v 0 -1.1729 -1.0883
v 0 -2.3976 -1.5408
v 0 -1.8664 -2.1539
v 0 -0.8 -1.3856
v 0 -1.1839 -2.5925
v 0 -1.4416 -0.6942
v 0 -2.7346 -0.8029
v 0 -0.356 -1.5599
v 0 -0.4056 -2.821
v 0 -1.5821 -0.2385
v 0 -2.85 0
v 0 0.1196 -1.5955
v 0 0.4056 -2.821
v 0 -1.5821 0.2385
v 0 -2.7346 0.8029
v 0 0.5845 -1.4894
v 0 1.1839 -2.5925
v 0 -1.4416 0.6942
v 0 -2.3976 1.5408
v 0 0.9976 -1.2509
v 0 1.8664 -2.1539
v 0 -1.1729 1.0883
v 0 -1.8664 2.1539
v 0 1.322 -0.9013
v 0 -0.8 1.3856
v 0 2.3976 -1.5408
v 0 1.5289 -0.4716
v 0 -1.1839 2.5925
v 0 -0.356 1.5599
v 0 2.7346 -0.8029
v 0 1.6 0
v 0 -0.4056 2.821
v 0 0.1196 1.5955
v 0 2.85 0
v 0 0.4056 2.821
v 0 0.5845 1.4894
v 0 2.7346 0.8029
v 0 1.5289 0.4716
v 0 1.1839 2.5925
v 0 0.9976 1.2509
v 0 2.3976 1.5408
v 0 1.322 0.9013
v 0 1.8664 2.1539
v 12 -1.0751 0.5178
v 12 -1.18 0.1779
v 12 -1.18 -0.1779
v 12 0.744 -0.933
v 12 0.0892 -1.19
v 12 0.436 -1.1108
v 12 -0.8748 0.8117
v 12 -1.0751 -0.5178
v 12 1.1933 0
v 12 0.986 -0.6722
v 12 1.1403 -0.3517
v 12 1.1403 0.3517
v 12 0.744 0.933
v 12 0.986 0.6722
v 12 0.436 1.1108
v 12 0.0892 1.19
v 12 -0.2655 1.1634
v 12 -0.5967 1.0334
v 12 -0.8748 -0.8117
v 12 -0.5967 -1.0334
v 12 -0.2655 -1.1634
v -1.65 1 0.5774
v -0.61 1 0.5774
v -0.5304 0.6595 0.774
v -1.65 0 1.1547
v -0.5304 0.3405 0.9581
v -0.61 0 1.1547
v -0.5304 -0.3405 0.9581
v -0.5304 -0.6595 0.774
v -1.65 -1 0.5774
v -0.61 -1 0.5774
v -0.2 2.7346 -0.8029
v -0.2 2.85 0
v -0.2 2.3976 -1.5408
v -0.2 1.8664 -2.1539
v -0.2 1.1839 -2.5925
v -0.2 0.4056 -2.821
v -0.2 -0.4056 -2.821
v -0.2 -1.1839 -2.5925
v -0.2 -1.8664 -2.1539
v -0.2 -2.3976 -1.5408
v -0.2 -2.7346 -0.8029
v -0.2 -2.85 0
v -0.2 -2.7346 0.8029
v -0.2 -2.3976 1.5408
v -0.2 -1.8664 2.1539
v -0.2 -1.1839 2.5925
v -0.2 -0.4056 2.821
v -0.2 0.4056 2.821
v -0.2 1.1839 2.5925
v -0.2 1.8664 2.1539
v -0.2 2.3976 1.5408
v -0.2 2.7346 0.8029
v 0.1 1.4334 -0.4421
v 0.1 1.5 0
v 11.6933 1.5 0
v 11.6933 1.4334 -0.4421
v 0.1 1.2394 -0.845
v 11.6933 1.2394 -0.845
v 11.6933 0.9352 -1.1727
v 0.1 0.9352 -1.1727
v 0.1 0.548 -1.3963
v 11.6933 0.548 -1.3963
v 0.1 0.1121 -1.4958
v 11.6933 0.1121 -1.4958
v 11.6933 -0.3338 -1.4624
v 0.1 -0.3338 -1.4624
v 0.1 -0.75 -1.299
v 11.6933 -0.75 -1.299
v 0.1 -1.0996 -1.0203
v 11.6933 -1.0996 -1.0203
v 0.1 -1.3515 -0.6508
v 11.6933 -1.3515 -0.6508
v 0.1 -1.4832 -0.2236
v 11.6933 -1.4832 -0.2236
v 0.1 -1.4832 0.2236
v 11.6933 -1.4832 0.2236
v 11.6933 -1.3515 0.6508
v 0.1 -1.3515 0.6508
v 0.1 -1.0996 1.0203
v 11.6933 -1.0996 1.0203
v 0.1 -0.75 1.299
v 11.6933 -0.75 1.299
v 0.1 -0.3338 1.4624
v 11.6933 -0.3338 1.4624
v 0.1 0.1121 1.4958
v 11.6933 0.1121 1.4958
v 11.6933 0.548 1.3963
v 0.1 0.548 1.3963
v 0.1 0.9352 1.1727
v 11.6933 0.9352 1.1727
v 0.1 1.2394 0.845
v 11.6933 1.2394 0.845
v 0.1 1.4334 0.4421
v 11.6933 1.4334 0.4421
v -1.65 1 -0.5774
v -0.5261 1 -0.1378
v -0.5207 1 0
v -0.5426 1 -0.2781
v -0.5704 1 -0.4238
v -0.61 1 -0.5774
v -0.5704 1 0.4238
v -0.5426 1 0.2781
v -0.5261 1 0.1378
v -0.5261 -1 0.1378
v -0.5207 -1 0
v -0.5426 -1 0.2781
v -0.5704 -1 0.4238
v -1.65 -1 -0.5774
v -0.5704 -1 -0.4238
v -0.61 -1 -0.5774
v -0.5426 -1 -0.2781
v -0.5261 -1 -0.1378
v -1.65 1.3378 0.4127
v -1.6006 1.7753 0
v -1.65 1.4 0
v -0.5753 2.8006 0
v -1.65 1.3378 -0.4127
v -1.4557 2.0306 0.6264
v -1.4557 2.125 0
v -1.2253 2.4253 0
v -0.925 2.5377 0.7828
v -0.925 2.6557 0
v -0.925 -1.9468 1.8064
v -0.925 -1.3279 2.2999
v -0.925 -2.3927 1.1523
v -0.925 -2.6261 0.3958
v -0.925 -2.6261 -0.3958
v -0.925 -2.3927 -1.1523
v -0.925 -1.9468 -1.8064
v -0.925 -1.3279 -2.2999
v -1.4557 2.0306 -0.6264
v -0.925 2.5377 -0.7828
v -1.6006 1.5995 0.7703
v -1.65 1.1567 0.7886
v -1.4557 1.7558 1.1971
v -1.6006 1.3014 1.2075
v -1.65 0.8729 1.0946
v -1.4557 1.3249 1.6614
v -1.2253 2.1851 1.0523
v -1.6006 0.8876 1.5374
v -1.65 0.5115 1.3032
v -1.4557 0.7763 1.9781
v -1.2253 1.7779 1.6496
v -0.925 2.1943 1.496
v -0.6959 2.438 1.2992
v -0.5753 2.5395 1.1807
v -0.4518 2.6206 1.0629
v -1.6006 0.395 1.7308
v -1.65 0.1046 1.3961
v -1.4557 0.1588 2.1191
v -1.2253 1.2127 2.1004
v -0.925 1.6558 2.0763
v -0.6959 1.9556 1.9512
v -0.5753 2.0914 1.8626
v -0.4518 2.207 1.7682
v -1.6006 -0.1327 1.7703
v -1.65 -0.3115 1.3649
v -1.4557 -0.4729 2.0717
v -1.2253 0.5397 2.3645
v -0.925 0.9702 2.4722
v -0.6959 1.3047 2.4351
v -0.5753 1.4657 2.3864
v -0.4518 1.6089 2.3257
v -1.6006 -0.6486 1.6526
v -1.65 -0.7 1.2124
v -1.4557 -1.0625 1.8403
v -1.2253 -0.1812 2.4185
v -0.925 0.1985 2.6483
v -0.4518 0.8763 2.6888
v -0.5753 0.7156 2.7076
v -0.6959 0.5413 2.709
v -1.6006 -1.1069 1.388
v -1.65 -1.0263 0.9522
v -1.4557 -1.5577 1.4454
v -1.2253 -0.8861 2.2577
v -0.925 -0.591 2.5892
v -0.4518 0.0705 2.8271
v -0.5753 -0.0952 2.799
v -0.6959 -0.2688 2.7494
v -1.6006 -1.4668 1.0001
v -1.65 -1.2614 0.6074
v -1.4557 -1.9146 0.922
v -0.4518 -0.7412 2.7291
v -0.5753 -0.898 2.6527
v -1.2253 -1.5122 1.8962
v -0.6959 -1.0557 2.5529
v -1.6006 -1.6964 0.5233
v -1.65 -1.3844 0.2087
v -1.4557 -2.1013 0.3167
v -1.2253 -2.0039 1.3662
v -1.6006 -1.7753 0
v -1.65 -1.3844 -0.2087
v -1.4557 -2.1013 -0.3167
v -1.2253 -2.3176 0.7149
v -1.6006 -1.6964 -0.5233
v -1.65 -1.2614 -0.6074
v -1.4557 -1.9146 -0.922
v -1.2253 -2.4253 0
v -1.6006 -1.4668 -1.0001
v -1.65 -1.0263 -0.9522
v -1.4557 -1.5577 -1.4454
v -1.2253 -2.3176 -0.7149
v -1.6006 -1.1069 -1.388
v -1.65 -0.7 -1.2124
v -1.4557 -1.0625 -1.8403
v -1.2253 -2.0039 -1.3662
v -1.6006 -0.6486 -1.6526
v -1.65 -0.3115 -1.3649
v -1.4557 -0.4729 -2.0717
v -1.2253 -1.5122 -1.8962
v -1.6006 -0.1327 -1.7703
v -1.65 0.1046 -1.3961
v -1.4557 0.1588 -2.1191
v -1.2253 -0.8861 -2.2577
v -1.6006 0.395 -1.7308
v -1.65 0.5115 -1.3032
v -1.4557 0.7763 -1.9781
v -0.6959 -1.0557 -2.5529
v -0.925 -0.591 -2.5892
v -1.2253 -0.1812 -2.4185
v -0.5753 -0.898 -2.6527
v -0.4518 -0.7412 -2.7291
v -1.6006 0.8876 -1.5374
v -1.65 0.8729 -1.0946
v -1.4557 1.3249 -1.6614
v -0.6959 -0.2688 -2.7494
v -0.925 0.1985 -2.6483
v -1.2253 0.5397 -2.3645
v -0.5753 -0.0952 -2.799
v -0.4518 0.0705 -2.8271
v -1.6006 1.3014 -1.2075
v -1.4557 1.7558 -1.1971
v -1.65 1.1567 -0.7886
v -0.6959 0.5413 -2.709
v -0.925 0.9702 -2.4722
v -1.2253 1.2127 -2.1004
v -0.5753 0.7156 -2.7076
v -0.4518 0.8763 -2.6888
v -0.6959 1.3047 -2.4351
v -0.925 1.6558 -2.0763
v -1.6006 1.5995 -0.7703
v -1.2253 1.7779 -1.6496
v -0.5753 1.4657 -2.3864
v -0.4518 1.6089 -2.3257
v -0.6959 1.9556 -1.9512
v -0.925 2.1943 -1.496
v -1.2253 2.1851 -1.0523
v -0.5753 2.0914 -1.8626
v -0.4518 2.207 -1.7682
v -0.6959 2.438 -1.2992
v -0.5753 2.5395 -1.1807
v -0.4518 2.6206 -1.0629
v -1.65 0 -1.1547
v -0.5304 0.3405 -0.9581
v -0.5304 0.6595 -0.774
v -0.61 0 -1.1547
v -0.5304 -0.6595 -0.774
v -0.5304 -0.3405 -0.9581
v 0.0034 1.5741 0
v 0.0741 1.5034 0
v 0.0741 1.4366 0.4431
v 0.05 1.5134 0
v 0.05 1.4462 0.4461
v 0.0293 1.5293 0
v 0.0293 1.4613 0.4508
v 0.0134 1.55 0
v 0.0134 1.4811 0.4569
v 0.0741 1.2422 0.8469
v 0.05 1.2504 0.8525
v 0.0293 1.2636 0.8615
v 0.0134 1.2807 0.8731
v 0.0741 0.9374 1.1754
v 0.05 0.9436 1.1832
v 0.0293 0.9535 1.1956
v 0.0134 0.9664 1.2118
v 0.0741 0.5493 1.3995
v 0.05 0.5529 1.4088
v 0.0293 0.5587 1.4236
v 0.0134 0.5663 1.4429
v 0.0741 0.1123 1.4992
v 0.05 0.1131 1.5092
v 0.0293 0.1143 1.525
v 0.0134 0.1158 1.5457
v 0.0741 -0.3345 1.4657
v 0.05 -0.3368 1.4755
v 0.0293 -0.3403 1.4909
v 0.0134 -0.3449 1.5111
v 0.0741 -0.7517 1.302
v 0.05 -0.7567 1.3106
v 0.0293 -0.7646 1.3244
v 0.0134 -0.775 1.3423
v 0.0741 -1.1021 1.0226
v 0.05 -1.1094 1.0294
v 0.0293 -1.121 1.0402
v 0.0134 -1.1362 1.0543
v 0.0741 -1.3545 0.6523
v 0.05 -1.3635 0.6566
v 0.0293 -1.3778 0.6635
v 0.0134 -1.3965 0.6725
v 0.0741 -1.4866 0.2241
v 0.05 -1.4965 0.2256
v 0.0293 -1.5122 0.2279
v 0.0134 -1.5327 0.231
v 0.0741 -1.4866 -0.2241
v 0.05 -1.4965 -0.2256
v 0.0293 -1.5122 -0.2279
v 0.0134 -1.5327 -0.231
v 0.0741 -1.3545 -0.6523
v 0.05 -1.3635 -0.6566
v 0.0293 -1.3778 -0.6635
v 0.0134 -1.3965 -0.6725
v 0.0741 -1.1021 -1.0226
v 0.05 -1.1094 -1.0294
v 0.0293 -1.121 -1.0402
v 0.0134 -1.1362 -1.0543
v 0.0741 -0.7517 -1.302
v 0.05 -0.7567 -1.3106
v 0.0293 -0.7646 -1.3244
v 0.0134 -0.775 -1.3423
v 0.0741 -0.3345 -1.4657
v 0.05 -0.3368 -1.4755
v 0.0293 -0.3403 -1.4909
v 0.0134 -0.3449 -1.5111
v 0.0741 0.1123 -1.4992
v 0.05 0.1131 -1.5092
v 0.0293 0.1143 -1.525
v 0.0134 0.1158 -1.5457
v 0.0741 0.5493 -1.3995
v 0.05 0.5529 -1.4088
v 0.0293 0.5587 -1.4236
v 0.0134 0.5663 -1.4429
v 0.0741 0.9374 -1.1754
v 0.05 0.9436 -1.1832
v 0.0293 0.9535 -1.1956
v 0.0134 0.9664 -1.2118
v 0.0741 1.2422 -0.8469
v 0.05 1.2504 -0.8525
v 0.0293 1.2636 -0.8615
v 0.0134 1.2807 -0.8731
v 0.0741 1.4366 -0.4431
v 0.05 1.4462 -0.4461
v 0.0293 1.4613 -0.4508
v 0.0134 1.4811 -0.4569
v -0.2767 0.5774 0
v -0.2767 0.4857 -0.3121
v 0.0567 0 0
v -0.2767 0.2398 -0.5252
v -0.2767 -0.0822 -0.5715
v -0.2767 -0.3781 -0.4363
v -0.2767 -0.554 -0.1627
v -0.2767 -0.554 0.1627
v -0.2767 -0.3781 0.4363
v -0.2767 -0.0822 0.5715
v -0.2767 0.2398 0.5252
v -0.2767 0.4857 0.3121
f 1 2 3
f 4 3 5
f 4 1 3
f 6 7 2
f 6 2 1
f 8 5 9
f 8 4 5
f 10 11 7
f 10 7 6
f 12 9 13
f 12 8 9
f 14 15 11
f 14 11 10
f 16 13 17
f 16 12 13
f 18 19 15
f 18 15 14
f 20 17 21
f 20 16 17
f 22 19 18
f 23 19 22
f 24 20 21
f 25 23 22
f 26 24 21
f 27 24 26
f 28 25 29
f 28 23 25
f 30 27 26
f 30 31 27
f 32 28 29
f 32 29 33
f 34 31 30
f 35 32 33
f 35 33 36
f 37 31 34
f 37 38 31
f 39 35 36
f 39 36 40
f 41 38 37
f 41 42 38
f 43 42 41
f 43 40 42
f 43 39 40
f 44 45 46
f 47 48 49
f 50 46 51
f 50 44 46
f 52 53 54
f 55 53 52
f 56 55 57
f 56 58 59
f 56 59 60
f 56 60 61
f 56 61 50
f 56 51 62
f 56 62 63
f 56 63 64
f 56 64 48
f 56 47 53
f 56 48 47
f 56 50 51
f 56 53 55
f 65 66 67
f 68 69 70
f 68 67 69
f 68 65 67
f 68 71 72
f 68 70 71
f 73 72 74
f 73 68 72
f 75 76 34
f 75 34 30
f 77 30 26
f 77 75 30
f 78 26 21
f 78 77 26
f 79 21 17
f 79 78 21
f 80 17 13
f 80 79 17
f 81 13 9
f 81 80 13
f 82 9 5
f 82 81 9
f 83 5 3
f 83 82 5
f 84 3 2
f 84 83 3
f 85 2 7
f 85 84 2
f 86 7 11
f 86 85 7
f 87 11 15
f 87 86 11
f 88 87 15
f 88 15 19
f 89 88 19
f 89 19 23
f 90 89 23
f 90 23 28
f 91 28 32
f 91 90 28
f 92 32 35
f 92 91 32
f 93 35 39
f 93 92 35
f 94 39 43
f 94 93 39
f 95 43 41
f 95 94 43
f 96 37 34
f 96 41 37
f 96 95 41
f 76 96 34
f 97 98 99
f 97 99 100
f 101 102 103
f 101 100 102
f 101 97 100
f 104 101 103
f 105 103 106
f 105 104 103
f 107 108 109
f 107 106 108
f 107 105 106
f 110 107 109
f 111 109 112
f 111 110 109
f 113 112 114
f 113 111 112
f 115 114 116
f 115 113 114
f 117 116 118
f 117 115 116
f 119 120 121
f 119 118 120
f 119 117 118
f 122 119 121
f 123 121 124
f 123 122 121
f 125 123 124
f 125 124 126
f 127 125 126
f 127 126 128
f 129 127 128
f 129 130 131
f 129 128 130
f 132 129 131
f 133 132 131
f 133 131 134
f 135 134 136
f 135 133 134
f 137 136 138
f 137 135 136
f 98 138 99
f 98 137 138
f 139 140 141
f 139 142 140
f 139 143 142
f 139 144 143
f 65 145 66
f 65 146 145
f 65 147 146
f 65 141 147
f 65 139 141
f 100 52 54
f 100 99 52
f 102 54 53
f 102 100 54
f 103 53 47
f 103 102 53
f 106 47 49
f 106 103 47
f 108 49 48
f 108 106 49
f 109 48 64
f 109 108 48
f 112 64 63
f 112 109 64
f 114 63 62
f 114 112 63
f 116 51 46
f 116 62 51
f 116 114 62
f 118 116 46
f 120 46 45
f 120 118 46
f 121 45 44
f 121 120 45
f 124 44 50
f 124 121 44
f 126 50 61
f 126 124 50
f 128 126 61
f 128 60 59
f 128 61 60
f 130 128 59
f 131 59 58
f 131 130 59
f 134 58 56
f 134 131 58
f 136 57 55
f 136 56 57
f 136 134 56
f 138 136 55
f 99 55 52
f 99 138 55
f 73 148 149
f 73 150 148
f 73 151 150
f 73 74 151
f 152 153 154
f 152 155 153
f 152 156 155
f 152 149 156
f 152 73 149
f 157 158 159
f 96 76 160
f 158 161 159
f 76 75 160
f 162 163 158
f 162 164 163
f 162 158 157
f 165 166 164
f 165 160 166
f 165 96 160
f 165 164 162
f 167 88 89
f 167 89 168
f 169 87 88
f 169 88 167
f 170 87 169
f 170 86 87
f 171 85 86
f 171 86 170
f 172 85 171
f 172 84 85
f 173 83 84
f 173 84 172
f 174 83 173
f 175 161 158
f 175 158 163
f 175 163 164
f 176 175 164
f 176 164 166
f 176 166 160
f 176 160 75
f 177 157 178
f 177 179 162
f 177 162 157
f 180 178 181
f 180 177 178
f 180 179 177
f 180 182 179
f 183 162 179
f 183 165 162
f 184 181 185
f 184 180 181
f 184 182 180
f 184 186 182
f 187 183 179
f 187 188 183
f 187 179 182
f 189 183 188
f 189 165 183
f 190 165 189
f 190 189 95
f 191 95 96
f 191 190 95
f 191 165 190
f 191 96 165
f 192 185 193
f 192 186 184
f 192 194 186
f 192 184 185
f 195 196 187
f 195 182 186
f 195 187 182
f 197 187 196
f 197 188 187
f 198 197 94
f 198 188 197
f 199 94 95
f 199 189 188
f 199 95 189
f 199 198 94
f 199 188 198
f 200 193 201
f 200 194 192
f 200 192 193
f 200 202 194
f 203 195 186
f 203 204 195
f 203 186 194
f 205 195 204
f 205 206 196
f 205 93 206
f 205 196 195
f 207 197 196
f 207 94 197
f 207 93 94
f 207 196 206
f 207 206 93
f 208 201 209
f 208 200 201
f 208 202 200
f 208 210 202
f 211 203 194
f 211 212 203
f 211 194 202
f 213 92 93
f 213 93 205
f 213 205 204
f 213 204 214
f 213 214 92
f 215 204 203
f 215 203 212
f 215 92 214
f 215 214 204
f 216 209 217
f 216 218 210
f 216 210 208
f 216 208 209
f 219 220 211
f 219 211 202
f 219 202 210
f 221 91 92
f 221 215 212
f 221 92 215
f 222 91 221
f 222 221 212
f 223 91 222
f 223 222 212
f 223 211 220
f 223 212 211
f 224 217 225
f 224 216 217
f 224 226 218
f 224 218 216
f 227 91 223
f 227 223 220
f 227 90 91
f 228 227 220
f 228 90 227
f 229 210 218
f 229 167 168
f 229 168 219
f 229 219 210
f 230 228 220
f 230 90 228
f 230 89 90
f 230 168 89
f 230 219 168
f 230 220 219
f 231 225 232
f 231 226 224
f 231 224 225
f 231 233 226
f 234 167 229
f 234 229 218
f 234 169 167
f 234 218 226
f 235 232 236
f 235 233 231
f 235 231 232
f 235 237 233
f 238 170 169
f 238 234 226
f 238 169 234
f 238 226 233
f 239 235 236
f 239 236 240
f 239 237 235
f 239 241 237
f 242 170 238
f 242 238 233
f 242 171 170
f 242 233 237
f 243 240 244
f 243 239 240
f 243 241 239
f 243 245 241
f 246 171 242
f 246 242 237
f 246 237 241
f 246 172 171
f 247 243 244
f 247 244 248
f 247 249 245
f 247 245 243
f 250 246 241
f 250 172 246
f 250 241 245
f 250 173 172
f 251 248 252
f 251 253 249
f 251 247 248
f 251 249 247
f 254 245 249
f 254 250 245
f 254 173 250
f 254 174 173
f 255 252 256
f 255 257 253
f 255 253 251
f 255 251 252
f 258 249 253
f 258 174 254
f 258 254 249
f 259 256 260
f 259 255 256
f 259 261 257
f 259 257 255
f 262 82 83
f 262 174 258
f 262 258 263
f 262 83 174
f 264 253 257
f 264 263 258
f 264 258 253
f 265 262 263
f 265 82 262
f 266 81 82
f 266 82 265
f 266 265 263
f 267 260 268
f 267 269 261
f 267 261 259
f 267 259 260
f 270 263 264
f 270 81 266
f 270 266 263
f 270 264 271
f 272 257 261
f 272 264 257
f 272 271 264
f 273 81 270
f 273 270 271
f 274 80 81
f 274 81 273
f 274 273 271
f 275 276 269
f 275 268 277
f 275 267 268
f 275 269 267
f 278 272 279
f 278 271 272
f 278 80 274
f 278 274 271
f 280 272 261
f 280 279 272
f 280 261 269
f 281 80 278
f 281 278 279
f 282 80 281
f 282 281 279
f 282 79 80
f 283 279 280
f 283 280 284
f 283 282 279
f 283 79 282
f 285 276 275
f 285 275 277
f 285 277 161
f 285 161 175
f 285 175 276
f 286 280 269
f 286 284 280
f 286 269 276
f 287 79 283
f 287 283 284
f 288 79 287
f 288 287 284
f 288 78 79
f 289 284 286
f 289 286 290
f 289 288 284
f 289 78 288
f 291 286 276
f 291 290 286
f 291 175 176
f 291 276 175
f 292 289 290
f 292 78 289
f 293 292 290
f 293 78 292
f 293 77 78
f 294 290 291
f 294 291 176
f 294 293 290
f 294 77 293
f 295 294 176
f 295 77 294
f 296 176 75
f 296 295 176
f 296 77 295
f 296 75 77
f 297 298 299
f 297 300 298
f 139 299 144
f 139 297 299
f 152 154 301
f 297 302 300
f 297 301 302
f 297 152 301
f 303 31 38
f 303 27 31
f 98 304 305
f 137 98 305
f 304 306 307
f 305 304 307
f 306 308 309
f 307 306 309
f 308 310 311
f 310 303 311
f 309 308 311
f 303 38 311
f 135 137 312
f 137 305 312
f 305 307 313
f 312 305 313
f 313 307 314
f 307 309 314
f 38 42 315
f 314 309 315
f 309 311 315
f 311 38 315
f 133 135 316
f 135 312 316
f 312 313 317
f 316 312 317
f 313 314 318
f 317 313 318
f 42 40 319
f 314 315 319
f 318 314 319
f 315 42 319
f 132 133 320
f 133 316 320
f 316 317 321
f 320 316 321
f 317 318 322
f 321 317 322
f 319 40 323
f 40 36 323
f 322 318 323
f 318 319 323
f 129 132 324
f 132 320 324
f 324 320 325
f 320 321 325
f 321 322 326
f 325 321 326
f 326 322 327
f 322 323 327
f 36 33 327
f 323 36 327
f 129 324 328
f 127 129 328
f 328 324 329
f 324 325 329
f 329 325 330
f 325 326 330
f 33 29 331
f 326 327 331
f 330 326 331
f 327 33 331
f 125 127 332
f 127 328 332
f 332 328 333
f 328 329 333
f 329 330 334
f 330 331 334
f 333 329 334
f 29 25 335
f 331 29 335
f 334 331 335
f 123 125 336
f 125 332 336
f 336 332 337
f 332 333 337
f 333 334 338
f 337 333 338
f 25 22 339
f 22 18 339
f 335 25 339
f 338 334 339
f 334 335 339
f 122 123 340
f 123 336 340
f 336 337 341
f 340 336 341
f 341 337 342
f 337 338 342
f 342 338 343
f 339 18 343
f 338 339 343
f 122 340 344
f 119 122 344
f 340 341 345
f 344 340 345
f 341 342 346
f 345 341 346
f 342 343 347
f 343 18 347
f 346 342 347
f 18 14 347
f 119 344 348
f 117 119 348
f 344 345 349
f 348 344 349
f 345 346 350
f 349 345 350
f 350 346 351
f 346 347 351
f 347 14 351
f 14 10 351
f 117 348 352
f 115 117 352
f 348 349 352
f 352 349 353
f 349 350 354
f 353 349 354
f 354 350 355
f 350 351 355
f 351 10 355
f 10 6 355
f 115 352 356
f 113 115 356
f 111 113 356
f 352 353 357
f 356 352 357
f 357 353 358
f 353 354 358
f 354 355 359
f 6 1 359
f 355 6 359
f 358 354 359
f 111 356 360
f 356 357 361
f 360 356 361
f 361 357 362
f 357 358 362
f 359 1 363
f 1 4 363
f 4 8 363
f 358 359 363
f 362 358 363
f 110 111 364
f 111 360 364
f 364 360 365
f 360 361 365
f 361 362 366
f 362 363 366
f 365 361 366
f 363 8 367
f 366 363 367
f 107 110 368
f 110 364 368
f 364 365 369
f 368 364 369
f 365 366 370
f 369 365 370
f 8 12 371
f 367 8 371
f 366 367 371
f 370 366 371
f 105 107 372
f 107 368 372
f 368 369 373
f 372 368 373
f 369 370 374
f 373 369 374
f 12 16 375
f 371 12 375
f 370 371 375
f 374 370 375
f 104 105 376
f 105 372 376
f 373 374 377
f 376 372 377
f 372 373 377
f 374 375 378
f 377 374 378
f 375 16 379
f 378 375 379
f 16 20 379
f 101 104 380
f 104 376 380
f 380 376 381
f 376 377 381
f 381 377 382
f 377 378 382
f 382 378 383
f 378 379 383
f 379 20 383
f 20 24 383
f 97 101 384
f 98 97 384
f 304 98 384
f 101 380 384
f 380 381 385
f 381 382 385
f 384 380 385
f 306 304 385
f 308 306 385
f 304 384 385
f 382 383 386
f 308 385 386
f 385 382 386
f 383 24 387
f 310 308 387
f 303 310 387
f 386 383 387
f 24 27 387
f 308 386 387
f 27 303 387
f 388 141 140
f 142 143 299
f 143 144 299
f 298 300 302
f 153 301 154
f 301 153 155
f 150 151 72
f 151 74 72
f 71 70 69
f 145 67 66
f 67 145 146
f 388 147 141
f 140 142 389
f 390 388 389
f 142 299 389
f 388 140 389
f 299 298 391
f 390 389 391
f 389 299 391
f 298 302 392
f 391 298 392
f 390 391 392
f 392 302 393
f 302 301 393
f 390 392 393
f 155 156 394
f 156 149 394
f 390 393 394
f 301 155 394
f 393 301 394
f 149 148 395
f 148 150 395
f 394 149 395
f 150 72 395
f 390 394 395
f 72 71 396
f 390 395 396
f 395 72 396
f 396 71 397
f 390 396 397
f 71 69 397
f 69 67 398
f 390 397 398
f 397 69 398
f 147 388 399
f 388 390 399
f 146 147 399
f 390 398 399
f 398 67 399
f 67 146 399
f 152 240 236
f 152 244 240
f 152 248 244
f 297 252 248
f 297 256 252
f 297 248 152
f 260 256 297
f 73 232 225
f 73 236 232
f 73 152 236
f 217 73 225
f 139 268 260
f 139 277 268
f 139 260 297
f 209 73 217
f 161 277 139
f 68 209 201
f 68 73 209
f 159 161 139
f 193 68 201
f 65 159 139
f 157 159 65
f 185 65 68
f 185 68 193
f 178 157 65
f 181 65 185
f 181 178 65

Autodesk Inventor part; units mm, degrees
ref_plane "YZ Plane" through (0, 0, 0) normal (1, 0, 0) x (0, 1, 0)
ref_plane "XZ Plane" through (0, 0, 0) normal (0, 1, 0) x (-1, 0, 0)
sketch "Sketch1" plane through (0, 0, 0) normal (0, 0, 1) x (1, 0, 0)
  line L0 (0.0567, 0) -> (12, 0)
  line L1 (12, 0) -> (12, 1.5)
  line L2 (12, 1.5) -> (1, 1.5)
  line L3 (1, 1.5) -> (0.6932, 1.5)
  line L4 (0.6932, 1.5) -> (0, 1.5)
  line L5 (0, 1.5) -> (0, 2.85)
  line L6 (0, 2.85) -> (-1.65, 2.85)
  line L7 (-1.65, 2.85) -> (-1.65, 1.1547)
  line L8 (-1.65, 1.1547) -> (-0.61, 1.1547)
  line L9 (-0.61, 1.1547) -> (0.0567, 0)
  line L10 (-4.38, 0) -> (14.73, 0) projected
  line L11 (0, -0.57) -> (0, 3.42) projected
  line L12 (1, 1.5) -> (0, 1.5) construction
  dimension "d1" = 11
  dimension "d2" = 0.3068
  dimension "d3" = 1.65
  dimension "d4" = 1.04
  dimension "d5" = 60
  dimension "d6" = 3
  dimension "d7" = 3
  dimension "d8" = 2.3094
  dimension "d9" = 5.7
  dimension "d26" = 12
revolve "Body" add sketch "Sketch1" angle 360 about axis through (0.0567, 0, 0) along (1, 0, 0) contours L9 L11 L4 L3 L2 L1 L0 | L9 L8 L7 L6 L5 L11
sketch "Sketch2" plane through (-1.65, 0, 0) normal (-1, 0, 0) x (0, 0, 1)
  circle A0 centre (0, 0) radius 1.1547 projected
  line L0 (0, -3.99) -> (0, 3.99) projected
  line L1 (-3.99, 0) -> (3.99, 0) projected
  line L2 (1.1547, 0) -> (0.5774, -1)
  line L3 (0.5774, -1) -> (-0.5774, -1)
  line L4 (-0.5774, -1) -> (-1.1547, 0)
  line L5 (-1.1547, 0) -> (-0.5774, 1)
  line L6 (-0.5774, 1) -> (0.5774, 1)
  line L7 (0.5774, 1) -> (1.1547, 0)
extrude "Slot" add sketch "Sketch2" against normal up to next contours L7 A0 | A0 L2 | L6 L0 A0 | A0 L0 L3 | L0 L6 A0 | A0 L3 L0 | L4 A0 | A0 L5
fillet "Fillet1" radius 1.45 1 edges at (-1.65, -2.85, 0)
thread "Thread" size "M3x0.5" designation "M3" class "6g" standard "GB Metric profile" length 11
chamfer "Chamfer1" distance 0.3067 distance2 0.3067 1 edges at (12, -1.5, 0) measured on face at (12, -0.6587, -0.1791)
ref_plane "Work Plane1" through (29, 0, 0) normal (0, -1, 0) x (1, 0, 0)
fillet "Fillet2" radius 0.1 1 edges at (0, -1.5, 0)
equation "\"d1\" = GEL"
equation "\"d3\" = KOH"
equation "\"d4\" = INTI"
equation "\"d6\" = GD"
equation "\"d7\" = BDM"
equation "\"d8\" = 1.1547 * SW"
equation "\"d9\" = KOD"
equation "\"d26\" = NLG"
equation "\"d30\" = R"
equation "\"d17\" = RR"
equation "\"d13\" = GEL"
equation "\"d15\" = -0.5 * SPD + 0.5 * GD"
equation "\"d16\" = GUL"
equation "\"GD\" = 3"
equation "\"NLG\" = 12"
equation "\"GEL\" = 11"
equation "\"KOD\" = 5.7"
equation "\"KOH\" = 1.65"
equation "\"INTI\" = 1.04"
equation "\"GAL\" = 0.61345 * PTC"
equation "\"GUL\" = 0.61345 * PTC"
equation "\"BDM\" = 3"
equation "\"SW\" = 2"
equation "\"RR\" = 1.45"
equation "\"SPD\" = NND - 1.2269 * PTC"
equation "\"R\" = 0.1"
equation "\"TOA\" = 30deg"
equation "\"GD1\" = THREADDIA - 1.2269 * PTC"
equation "\"THREADDIA\" = 3"
equation "\"PTC\" = 0.5"
equation "\"NND\" = 3"
equation "\"KOH1\" = 0.2"
equation "\"E0\" = 2.31"
properties part number "Screw GB/T 70.2 M3 X 12" material "Steel, Mild"
